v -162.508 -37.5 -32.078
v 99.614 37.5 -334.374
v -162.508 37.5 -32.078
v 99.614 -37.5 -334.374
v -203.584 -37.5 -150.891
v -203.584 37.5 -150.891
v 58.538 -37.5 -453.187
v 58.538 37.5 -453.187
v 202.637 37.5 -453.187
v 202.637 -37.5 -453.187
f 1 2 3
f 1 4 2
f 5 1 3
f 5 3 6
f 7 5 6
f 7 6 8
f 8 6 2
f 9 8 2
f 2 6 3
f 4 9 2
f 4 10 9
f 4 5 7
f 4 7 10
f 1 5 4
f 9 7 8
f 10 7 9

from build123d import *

# Parameters (mm, degrees)
F1_DEPTH = 37.5


with BuildPart() as f1:
    # F0 (on Front) → F1 (new body, symmetric)
    with BuildSketch(Plane.XZ):
        Polygon((99.613749, -334.373749), (-162.507823, -32.078042), (-203.583934, -150.890968), (58.537638, -453.186675), align=None)
        Polygon((202.636817, -453.186675), (99.613749, -334.373749), (58.537638, -453.186675), align=None)
    extrude(amount=F1_DEPTH, both=True)


solid = f1.part
